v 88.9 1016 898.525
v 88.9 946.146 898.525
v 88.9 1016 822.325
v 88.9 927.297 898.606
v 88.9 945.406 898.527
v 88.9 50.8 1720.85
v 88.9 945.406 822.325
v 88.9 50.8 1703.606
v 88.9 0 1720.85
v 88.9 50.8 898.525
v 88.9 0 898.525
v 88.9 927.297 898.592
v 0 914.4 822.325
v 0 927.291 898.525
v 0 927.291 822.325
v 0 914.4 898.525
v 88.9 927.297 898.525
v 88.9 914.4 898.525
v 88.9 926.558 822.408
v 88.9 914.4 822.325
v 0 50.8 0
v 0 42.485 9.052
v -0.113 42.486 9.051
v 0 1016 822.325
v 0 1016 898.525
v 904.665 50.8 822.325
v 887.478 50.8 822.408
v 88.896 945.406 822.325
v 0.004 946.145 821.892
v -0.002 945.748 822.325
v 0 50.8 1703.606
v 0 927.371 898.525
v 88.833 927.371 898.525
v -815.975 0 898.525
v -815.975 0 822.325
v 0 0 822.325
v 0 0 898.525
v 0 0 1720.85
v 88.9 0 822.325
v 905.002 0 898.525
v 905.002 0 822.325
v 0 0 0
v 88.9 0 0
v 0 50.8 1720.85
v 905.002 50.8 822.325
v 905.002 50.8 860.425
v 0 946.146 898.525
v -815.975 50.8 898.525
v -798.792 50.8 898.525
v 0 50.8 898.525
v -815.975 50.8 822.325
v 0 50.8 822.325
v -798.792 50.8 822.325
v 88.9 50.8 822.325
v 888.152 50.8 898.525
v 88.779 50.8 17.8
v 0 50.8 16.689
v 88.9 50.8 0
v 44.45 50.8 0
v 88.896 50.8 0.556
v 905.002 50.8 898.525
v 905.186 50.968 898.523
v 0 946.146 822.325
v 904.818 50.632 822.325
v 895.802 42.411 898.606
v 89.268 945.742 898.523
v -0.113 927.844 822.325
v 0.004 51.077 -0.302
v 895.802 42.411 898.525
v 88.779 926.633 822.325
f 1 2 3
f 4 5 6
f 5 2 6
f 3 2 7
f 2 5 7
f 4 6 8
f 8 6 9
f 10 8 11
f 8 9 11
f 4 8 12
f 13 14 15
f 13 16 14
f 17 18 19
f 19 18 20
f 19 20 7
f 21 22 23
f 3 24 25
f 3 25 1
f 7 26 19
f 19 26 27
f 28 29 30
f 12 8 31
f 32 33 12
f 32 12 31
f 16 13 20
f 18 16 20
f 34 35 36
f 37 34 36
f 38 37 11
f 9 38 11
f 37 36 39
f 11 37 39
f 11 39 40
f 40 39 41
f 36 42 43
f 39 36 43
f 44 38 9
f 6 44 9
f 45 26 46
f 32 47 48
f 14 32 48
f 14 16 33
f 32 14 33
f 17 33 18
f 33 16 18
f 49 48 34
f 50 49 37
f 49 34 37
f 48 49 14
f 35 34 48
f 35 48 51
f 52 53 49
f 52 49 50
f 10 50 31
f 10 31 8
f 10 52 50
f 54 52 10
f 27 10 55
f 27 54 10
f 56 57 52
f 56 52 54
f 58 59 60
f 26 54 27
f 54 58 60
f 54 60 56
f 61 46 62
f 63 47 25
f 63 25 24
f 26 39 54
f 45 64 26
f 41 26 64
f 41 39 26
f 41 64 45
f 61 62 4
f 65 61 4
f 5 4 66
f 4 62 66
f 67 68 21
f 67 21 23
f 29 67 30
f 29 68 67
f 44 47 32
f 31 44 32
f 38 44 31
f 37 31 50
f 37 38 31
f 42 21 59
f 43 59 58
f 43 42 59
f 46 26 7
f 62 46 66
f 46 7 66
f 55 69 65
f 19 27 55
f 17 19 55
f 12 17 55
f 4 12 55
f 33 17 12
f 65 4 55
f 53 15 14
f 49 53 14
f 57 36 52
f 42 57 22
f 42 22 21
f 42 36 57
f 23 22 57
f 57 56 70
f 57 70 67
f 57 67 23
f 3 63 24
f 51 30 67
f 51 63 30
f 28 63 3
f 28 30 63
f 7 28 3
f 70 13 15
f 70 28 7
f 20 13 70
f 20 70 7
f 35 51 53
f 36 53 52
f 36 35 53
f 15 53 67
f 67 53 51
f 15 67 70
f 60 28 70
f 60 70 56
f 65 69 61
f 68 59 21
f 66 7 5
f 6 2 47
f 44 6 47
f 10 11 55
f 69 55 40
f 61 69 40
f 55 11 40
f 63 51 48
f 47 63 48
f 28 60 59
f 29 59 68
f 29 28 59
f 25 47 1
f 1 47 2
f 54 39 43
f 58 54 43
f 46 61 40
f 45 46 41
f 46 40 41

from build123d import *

# Parameters (mm, degrees)
SKETCH1_W           = 88.9
SKETCH1_H           = 1720.85
SKETCH1_W_2         = 815.975
SKETCH1_H_2         = 76.2
SKETCH1_W_3         = 816.102
BOSS_EXTRUDE1_DEPTH = 50.8
SKETCH2_W           = 88.9
SKETCH2_H           = 76.2
BOSS_EXTRUDE2_DEPTH = 101.6
SKETCH11_W          = 76.200000018
SKETCH11_H          = 1210.925919092
BOSS_EXTRUDE6_DEPTH = 12.7
SKETCH12_W          = 88.9
SKETCH12_H          = 1215.673478613
BOSS_EXTRUDE7_DEPTH = 12.7
SKETCH13_W          = 76.2
SKETCH13_H          = 1211.38713944
BOSS_EXTRUDE8_DEPTH = 12.7
BOSS_EXTRUDE9_DEPTH = 12.7


with BuildPart() as part:
    # Sketch1 → Boss-Extrude1 (new body)
    with BuildSketch(Plane(origin=(0, 0, 0), x_dir=(1, 0, 0), z_dir=(0, 1, 0))):
        with Locations((44.45, -860.425)):
            Rectangle(SKETCH1_W, SKETCH1_H)
        with Locations((-407.9875, -860.425)):
            Rectangle(SKETCH1_W_2, SKETCH1_H_2)
        with Locations((496.951, -860.425)):
            Rectangle(SKETCH1_W_3, SKETCH1_H_2)
    extrude(amount=BOSS_EXTRUDE1_DEPTH)



with BuildPart() as body_2:
    # Sketch2 → Boss-Extrude2 (new body)
    with BuildSketch(Plane(origin=(0, 914.4, 0), x_dir=(1, 0, 0), z_dir=(0, 1, 0))):
        with Locations((44.45, -860.425)):
            Rectangle(SKETCH2_W, SKETCH2_H)
    extrude(amount=BOSS_EXTRUDE2_DEPTH)


with BuildPart() as part_1:
    add(part.part)

    add(body_2.part)  # Boss-Extrude6 merges body 2
    # Sketch11 → Boss-Extrude6 (add)
    with BuildSketch(Plane(origin=(515.239820979, 469.832103155, -4.562218888), x_dir=(0.004834466277190451, 0.004408408213341139, 0.9999785967073692), z_dir=(-0.7389010285363795, -0.6737822080618631, 0.006542639158684001))):
        with Locations((865.004917385, 33.212637894)):
            Rectangle(SKETCH11_W, SKETCH11_H)
    extrude(amount=BOSS_EXTRUDE6_DEPTH)

    # Sketch12 → Boss-Extrude7 (add)
    with BuildSketch(Plane(origin=(0, 880.564980502, 958.757073848), x_dir=(-1, 0, 0), z_dir=(0, -0.6764357489630263, -0.7365016480122972))):
        with Locations((-44.45, -518.793435578)):
            Rectangle(SKETCH12_W, SKETCH12_H)
    extrude(amount=BOSS_EXTRUDE7_DEPTH)

    # Sketch13 → Boss-Extrude8 (add)
    with BuildSketch(Plane(origin=(-471.041897908, 429.285012176, 0), x_dir=(0, 0, 1), z_dir=(-0.7391076653302462, 0.6735873061824078, 0))):
        with Locations((860.425, 93.609836957)):
            Rectangle(SKETCH13_W, SKETCH13_H)
    extrude(amount=-BOSS_EXTRUDE8_DEPTH)

    # Sketch14 → Boss-Extrude9 (add)
    with BuildSketch(Plane(origin=(0.320485024, 23.523248222, -25.60821453), x_dir=(-0.9999575295340857, 0.006234703363140706, -0.006787311843563117), z_dir=(0.009216242623115463, 0.6764620710773515, -0.7364198036892085))):
        Polygon((-88.579501445, 37.41171492), (0.316722931, 37.41171492), (0.316722931, 1252.792330393), (-88.579501445, 1252.540281398), align=None)
    extrude(amount=-BOSS_EXTRUDE9_DEPTH)


solid = part_1.part
